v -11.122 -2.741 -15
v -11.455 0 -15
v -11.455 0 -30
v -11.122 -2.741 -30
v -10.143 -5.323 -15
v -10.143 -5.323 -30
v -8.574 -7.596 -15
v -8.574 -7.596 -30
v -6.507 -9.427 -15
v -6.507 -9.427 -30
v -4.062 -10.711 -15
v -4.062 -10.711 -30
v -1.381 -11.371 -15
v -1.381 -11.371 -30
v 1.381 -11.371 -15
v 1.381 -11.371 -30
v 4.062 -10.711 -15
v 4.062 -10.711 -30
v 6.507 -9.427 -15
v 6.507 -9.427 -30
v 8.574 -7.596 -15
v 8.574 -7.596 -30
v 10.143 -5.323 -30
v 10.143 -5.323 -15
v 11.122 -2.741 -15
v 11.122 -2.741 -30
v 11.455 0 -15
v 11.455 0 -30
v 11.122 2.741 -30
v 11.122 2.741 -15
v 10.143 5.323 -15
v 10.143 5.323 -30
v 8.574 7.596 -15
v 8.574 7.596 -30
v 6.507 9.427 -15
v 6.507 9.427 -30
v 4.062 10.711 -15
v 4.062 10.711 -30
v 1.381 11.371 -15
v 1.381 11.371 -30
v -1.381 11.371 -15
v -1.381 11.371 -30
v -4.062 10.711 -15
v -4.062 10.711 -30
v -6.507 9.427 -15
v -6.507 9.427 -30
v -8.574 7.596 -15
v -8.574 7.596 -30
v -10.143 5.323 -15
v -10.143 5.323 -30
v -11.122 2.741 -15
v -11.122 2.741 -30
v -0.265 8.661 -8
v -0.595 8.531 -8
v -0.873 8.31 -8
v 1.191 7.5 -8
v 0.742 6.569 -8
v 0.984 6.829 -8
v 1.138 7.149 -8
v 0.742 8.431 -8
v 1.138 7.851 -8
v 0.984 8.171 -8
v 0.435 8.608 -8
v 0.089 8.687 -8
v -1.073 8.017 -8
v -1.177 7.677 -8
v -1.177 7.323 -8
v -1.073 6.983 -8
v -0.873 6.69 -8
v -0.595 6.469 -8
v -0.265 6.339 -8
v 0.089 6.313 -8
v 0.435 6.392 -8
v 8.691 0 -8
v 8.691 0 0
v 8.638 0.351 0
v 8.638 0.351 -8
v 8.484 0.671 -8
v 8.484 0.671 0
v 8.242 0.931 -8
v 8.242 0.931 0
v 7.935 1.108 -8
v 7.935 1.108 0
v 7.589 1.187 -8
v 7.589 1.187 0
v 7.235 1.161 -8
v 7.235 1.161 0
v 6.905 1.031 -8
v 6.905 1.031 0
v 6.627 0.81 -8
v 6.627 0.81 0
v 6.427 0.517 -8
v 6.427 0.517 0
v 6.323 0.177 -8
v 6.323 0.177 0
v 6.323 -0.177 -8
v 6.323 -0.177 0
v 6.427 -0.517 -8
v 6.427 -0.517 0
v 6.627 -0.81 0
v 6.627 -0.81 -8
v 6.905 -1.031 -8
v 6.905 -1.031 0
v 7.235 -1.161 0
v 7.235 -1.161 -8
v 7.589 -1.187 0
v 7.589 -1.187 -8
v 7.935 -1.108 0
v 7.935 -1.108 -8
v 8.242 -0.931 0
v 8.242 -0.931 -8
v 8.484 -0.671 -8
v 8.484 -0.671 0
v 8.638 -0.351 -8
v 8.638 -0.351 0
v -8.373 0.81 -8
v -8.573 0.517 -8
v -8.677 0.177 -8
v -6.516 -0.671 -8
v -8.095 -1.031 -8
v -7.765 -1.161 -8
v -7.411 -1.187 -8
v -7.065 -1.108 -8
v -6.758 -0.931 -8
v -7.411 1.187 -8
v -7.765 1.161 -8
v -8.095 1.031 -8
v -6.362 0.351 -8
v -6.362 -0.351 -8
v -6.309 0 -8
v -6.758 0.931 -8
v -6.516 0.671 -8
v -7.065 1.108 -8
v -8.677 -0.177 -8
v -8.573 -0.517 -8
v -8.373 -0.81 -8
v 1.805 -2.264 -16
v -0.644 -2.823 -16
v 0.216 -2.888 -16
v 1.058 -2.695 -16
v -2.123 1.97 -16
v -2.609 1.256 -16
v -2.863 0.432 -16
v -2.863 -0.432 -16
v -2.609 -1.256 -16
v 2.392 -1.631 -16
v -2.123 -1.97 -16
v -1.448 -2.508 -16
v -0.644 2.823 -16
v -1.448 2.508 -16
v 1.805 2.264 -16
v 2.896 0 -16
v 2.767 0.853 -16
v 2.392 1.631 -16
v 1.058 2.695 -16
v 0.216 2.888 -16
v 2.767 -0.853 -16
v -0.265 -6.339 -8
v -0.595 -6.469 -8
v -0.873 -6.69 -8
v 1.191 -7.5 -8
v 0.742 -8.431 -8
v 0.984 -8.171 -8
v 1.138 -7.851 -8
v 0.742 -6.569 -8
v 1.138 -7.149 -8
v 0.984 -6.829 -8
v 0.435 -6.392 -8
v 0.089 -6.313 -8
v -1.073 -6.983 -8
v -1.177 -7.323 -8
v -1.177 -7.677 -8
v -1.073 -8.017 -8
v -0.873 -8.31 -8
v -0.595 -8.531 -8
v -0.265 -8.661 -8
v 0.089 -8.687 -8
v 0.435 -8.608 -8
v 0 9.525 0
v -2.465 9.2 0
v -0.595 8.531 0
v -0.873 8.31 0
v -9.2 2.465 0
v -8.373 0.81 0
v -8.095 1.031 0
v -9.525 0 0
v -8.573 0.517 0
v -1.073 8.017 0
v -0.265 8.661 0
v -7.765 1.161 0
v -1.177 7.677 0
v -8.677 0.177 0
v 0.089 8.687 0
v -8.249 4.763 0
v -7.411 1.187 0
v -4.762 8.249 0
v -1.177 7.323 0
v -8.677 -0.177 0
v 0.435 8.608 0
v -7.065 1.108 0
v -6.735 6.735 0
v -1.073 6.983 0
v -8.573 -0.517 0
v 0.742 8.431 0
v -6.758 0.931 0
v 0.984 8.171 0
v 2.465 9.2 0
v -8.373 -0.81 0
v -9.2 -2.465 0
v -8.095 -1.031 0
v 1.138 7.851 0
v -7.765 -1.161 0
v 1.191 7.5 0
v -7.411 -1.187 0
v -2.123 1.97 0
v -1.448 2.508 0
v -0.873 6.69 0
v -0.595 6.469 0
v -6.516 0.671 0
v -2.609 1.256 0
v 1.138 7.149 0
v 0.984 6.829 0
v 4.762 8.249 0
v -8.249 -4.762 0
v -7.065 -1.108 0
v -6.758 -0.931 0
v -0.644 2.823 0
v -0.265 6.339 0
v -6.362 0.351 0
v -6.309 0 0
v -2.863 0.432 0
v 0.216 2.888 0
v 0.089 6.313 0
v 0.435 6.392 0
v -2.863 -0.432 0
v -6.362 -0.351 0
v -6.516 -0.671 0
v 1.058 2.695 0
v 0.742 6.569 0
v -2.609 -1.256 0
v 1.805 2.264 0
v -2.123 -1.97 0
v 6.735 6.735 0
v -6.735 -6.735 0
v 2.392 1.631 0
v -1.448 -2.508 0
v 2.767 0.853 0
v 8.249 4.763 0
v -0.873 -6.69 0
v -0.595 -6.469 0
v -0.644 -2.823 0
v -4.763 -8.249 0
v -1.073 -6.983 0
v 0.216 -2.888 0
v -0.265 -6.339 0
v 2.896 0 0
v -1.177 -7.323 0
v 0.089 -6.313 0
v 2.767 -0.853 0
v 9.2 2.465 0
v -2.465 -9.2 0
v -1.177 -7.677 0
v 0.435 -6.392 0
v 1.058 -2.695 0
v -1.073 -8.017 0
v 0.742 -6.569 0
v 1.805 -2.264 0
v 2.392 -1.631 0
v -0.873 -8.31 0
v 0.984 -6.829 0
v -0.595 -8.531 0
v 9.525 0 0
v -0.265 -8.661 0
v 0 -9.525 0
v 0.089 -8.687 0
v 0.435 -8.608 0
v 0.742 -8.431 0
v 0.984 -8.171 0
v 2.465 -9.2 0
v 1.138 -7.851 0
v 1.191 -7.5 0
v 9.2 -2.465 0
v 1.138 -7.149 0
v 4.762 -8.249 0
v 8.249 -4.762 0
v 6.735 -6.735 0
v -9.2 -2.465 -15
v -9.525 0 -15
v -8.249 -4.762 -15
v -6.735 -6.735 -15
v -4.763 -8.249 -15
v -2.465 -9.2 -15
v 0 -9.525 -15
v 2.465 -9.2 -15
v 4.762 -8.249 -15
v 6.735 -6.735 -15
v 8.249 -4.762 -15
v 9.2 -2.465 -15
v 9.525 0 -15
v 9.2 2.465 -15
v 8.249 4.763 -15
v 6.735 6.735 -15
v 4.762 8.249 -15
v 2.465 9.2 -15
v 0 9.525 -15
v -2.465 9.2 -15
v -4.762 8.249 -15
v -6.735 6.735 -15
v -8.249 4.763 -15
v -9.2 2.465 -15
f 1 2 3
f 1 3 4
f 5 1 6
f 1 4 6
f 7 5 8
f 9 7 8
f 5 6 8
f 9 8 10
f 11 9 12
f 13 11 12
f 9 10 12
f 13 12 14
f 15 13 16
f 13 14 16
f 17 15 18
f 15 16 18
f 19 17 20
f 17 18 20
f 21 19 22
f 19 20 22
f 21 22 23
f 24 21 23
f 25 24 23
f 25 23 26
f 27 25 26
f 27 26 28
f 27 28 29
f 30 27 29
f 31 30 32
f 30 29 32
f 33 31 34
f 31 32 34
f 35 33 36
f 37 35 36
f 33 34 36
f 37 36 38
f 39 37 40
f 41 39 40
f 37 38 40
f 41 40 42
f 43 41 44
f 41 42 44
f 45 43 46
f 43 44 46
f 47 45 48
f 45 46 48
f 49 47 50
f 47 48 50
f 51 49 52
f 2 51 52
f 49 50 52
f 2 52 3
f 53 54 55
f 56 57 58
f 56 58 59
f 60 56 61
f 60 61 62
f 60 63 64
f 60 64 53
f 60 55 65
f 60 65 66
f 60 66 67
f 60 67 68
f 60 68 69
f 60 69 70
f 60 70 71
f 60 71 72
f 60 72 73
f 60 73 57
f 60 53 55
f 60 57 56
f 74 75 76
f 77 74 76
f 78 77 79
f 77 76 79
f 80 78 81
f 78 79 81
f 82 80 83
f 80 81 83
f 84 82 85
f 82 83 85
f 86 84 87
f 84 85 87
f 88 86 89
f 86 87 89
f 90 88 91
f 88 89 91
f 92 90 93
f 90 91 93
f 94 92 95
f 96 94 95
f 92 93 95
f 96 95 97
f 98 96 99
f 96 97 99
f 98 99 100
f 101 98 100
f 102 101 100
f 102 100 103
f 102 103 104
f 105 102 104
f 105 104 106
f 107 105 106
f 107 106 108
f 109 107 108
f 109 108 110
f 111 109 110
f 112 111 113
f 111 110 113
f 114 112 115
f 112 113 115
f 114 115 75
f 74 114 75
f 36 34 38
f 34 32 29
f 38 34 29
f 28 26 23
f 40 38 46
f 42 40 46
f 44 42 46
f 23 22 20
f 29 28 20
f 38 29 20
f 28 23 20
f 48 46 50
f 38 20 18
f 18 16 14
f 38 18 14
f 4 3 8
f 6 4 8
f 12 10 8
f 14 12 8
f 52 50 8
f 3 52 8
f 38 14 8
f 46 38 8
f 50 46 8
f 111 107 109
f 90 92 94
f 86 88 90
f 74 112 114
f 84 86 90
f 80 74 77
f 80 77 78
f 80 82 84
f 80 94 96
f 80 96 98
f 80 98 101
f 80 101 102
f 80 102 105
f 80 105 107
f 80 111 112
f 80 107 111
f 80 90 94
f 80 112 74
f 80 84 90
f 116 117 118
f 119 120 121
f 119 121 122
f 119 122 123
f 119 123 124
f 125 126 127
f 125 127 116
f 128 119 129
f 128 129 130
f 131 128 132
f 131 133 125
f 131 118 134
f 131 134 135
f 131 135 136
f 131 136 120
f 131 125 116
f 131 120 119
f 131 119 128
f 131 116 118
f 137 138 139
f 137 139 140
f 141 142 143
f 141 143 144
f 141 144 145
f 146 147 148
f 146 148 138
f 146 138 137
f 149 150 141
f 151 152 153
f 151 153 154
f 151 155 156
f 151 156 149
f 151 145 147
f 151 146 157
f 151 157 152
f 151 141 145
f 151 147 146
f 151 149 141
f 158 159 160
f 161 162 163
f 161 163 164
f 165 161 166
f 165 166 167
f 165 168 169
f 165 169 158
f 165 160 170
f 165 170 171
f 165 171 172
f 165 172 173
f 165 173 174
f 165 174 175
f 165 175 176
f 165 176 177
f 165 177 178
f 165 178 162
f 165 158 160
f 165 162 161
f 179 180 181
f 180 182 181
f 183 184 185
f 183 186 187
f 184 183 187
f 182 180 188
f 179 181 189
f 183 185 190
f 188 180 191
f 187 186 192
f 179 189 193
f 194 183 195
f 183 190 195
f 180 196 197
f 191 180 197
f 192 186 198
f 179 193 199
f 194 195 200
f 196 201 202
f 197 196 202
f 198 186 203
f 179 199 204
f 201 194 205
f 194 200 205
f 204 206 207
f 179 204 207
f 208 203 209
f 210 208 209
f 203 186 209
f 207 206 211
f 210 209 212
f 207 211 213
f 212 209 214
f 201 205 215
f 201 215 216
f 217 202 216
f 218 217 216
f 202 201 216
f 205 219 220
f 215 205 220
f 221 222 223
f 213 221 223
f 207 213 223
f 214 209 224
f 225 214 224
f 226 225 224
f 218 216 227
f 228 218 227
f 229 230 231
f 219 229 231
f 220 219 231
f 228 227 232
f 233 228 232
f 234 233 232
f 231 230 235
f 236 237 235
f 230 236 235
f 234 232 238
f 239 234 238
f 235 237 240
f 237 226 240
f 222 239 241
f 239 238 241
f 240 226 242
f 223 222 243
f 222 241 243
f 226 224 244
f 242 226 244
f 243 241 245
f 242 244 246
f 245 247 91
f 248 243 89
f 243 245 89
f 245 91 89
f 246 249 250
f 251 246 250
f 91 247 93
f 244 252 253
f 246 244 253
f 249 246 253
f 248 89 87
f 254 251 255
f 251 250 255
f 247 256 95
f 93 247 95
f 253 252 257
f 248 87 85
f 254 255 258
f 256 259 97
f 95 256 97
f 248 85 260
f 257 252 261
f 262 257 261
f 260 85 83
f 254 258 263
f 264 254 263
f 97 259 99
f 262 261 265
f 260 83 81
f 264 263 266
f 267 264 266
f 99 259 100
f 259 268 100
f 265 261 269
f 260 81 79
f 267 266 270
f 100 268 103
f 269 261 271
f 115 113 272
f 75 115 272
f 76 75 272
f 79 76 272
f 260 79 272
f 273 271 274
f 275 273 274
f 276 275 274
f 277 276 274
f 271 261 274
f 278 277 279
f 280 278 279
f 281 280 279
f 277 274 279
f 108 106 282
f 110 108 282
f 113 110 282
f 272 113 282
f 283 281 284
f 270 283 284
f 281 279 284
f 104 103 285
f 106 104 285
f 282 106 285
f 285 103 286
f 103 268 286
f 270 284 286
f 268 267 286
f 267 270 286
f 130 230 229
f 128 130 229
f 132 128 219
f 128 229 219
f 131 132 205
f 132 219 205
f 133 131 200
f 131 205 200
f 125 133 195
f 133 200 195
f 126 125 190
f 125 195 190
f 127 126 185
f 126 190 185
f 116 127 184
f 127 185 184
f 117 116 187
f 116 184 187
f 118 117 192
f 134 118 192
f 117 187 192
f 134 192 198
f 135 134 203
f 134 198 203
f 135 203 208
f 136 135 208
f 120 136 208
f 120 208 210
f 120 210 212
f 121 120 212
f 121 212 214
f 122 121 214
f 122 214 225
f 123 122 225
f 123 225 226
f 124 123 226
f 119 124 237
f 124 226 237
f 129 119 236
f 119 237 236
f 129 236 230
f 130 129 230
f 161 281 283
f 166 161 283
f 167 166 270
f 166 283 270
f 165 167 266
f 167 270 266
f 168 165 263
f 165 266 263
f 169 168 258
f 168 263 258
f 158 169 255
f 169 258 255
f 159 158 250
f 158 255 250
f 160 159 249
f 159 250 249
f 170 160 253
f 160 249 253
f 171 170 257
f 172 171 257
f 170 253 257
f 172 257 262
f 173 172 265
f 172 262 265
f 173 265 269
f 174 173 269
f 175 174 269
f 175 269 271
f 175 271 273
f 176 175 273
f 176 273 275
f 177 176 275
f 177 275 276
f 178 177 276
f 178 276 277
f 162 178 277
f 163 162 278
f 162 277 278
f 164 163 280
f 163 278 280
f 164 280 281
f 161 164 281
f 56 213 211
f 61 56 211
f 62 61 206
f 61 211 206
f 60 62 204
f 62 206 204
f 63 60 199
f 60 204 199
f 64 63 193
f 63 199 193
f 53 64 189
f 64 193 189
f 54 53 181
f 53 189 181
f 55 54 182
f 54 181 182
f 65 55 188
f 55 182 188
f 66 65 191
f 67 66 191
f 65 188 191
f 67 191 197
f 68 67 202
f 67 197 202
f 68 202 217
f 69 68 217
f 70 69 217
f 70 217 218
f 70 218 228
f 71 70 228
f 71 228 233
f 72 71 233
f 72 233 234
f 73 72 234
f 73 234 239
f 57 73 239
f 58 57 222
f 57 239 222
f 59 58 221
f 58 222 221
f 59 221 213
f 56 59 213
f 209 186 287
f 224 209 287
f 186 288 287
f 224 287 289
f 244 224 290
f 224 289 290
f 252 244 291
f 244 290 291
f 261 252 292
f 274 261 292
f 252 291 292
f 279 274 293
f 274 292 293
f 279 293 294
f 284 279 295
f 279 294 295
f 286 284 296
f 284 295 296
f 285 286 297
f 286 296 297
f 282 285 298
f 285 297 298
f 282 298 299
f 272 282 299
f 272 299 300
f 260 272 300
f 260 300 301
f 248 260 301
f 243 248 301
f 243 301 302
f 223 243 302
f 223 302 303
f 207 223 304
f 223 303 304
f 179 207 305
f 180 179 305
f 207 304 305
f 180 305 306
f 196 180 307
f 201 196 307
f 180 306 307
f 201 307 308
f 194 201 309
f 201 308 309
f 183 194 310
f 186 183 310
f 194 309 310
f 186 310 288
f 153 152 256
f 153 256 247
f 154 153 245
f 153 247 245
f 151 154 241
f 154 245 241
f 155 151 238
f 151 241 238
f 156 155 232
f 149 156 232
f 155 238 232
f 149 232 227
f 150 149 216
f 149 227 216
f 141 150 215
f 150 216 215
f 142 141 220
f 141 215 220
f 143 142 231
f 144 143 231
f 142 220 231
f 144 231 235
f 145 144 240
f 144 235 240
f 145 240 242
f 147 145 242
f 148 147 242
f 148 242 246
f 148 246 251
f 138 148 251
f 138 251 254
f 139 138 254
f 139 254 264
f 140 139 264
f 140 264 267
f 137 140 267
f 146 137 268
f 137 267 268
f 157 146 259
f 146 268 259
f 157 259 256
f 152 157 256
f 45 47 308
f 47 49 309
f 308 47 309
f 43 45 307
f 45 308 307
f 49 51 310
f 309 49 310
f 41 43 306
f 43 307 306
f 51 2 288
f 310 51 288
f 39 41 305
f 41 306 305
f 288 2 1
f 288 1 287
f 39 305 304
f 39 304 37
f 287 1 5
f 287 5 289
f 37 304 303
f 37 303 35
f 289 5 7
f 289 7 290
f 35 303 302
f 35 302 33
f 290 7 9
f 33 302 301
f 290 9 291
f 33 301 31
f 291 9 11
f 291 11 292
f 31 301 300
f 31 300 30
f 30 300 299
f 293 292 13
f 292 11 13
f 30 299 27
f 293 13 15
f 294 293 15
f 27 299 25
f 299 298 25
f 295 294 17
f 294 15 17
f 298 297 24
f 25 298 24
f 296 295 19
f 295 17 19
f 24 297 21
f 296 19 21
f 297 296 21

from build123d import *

# Parameters (mm, degrees)
SKETCH1_3_R        = 1.190625
CUT_EXTRUDE1_DEPTH = 8
SKETCH1_R          = 2.8956
CUT_EXTRUDE2_DEPTH = 16


with BuildPart() as part:
    # Sketch2 → Revolve1 (revolve)
    with BuildSketch(Plane.YZ):
        Polygon((0, 0), (9.525, 0), (9.525, -15), (11.455, -15), (11.455, -30), (0, -30), align=None)
    revolve(axis=Axis((0, 0, -30), (0, 0, 1)))

    # Sketch1<3> → Cut-Extrude1 (cut)
    with BuildSketch(Plane(origin=(0, 0, 0), x_dir=(0, 1, 0), z_dir=(0, 0, 1))):
        with Locations((0, 7.5)):
            Circle(SKETCH1_3_R)
        with Locations((-7.5, 0)):
            Circle(SKETCH1_3_R)
        with Locations((7.5, 0)):
            Circle(SKETCH1_3_R)
        with Locations((0, -7.5)):
            Circle(SKETCH1_3_R)
    extrude(amount=-CUT_EXTRUDE1_DEPTH, mode=Mode.SUBTRACT)

    # Sketch1 → Cut-Extrude2 (cut)
    with BuildSketch(Plane(origin=(0, 0, 0), x_dir=(0, 1, 0), z_dir=(0, 0, 1))):
        Circle(SKETCH1_R)
    extrude(amount=-CUT_EXTRUDE2_DEPTH, mode=Mode.SUBTRACT)


solid = part.part
